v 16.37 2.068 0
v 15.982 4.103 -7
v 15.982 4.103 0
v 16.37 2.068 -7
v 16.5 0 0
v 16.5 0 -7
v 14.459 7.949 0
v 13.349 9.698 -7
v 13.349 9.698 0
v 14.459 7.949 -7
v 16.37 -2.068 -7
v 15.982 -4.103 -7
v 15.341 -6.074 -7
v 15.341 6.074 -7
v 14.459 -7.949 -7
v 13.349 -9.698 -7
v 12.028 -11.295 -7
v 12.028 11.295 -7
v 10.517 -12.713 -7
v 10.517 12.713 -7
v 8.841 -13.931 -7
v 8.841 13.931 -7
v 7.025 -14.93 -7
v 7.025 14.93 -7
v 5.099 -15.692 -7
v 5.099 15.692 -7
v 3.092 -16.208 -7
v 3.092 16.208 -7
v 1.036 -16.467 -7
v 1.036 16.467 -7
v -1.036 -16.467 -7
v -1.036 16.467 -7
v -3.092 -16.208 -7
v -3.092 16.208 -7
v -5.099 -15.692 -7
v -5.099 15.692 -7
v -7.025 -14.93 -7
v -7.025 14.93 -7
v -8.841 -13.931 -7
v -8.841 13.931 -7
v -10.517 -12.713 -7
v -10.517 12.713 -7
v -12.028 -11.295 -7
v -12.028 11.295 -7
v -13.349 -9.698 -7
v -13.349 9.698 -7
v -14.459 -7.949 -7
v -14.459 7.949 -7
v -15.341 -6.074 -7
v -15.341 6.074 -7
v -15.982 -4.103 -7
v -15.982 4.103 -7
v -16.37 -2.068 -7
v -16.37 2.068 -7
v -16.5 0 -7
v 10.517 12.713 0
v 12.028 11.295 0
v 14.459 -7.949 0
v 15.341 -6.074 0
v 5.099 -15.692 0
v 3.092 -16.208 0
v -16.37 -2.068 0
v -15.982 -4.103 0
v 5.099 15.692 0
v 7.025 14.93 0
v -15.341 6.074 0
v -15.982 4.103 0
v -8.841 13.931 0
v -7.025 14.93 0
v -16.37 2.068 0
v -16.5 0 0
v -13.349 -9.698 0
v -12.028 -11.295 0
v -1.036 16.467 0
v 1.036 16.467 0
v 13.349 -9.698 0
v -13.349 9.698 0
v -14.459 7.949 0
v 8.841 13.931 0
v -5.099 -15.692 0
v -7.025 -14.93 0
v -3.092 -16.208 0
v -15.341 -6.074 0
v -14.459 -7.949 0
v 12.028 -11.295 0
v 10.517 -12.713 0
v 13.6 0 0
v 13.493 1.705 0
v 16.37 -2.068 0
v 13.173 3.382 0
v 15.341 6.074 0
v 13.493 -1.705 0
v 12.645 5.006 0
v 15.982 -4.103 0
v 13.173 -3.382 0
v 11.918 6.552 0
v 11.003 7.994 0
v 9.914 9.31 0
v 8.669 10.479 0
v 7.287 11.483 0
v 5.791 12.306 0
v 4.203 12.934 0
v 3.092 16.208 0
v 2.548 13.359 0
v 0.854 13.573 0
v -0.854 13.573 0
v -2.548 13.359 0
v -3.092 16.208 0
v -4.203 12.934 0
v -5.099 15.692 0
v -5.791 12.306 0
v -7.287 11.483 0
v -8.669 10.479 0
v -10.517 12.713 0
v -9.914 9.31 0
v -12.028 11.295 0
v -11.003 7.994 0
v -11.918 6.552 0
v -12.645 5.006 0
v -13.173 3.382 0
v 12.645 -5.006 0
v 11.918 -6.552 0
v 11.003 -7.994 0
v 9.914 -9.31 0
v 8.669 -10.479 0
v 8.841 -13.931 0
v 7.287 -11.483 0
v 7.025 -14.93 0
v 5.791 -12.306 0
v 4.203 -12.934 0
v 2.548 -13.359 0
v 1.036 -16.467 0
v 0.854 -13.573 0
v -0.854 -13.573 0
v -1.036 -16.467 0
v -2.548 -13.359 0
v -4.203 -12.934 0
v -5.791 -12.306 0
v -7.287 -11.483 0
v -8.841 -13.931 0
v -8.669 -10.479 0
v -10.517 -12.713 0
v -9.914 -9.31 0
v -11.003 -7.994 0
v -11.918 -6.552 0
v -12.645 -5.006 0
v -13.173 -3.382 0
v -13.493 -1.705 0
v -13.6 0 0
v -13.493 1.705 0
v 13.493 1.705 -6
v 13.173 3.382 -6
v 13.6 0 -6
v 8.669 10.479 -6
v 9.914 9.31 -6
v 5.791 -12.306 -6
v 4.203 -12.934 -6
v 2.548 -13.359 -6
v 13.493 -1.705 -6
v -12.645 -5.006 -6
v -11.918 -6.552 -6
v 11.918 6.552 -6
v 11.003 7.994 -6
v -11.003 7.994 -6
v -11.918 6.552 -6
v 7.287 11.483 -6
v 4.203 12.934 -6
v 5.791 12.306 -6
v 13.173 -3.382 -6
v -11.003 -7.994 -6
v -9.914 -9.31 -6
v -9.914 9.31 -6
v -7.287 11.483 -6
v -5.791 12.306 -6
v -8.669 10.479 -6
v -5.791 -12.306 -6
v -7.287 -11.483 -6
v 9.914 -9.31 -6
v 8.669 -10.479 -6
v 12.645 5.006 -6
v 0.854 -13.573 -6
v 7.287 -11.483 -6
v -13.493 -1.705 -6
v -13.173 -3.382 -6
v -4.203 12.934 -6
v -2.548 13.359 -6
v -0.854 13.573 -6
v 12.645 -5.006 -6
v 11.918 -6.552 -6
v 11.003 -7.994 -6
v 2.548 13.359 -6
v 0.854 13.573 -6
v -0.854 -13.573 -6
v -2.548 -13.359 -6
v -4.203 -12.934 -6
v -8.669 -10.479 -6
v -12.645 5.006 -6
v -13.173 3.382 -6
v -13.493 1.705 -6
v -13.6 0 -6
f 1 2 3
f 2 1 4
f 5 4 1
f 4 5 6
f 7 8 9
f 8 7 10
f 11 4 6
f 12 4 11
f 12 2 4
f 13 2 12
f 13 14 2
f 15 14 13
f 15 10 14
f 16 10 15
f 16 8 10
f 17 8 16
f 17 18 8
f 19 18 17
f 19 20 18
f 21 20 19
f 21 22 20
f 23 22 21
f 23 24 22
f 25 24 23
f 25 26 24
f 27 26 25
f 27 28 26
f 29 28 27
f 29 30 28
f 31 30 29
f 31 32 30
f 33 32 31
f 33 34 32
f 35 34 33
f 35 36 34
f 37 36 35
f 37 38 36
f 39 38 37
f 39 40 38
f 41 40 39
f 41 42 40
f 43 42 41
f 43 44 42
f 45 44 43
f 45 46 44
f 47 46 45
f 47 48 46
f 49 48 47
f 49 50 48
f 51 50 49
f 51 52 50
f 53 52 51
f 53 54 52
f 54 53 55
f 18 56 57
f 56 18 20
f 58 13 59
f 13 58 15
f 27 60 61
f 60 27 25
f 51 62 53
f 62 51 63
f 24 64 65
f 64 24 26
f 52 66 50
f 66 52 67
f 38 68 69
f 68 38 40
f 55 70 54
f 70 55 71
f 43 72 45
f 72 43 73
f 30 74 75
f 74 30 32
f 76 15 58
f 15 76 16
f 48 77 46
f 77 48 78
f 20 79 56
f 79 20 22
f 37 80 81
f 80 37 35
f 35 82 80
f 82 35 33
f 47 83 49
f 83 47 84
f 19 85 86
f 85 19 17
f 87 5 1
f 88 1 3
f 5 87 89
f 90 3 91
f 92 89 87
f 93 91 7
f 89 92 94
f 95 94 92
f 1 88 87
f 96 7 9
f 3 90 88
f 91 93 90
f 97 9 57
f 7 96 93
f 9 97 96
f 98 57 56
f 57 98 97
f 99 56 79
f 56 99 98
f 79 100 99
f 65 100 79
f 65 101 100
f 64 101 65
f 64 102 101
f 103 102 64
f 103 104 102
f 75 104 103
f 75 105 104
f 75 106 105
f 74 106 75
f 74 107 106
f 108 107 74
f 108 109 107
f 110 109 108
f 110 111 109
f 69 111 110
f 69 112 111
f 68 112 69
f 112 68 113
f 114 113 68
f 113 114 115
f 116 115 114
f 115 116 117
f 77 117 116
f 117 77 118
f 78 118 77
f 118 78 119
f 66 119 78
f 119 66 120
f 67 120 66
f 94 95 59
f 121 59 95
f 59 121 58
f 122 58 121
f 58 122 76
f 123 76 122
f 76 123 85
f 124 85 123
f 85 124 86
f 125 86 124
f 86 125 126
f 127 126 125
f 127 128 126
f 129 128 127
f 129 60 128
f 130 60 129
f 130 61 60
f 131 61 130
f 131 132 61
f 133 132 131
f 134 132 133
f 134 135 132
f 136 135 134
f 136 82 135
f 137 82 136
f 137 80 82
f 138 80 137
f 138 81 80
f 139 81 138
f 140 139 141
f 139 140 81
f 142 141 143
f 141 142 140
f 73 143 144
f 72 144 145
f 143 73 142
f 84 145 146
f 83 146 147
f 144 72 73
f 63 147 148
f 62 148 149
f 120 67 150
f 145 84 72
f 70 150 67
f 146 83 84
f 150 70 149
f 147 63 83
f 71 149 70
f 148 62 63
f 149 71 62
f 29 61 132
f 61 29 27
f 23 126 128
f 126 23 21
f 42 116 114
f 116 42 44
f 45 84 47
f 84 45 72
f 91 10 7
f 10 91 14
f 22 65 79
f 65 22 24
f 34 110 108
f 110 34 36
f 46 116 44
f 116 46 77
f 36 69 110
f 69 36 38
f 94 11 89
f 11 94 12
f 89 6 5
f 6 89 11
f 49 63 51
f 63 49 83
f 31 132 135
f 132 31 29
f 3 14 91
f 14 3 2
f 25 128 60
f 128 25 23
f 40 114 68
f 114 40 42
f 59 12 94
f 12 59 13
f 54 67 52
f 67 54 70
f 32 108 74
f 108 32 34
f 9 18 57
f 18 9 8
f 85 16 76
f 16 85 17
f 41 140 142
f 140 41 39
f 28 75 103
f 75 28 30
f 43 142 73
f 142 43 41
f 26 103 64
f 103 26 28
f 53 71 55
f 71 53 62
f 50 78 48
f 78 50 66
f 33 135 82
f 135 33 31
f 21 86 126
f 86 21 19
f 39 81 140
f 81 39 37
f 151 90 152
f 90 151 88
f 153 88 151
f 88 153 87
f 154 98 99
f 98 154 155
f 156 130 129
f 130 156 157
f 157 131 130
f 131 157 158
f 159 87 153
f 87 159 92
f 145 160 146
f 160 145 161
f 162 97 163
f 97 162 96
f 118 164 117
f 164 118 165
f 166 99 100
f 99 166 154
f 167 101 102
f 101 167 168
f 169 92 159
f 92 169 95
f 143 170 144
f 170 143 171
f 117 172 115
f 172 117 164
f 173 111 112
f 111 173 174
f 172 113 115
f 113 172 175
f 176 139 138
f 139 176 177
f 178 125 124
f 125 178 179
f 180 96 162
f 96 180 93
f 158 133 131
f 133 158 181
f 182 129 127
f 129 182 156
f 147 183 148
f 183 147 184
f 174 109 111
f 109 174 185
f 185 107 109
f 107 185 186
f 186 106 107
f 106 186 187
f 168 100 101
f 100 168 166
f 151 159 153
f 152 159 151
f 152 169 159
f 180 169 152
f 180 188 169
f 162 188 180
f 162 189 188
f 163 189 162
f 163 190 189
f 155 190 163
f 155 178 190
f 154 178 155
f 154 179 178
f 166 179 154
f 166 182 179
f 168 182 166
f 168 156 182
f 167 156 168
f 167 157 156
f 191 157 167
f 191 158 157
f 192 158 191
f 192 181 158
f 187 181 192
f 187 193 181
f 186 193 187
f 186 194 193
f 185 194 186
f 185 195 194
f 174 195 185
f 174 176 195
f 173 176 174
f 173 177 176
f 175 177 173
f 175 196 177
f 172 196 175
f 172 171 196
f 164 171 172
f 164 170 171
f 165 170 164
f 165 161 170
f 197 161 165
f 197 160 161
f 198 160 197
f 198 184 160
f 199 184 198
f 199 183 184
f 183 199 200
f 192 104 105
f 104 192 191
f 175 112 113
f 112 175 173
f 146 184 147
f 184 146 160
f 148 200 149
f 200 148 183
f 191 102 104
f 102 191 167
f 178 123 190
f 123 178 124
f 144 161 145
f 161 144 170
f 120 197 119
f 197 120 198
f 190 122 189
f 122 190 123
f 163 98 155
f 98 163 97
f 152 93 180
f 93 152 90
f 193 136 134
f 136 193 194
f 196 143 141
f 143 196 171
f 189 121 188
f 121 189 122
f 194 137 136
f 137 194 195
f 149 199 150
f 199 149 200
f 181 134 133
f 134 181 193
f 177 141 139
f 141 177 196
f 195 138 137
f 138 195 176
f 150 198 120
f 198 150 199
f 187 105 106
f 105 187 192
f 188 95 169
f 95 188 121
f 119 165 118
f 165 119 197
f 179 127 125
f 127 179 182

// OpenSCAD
$fn = 50;


difference() {
	union() {
		translate(v = [0, 0, -7.0000000000]) {
			cylinder(h = 7, r = 16.5000000000);
		}
	}
	union() {
		#translate(v = [0, 0, -6.0000000000]) {
			cylinder(h = 6, r = 13.6000000000);
		}
	}
}
